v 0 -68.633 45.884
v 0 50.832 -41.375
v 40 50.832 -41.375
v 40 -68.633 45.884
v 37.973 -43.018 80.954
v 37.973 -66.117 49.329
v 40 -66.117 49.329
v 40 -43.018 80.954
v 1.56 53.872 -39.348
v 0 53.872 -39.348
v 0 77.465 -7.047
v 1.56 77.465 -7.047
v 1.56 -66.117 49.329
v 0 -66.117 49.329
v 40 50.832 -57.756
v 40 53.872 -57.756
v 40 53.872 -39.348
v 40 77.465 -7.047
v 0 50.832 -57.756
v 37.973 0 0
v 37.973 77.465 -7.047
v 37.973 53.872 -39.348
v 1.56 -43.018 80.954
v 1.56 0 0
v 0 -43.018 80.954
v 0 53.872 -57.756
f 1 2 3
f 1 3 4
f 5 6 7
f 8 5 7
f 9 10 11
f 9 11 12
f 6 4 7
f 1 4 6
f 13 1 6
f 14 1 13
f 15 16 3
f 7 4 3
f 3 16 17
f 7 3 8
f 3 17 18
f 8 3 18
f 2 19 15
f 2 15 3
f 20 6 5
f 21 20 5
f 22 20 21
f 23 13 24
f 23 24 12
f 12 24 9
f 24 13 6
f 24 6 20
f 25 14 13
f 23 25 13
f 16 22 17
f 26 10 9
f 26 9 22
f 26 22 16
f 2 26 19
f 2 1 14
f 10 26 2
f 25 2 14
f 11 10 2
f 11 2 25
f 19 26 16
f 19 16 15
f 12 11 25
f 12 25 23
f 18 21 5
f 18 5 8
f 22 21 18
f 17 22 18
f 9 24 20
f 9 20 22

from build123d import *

# Parameters (mm, degrees)
BOSS_EXTRUDE1_DEPTH = 40
SKETCH4_W           = 1.560342198
SKETCH4_H           = 149.198591979
BOSS_EXTRUDE2_DEPTH = 40
SKETCH6_W           = 2.027300843
SKETCH6_H           = 149.198591979
BOSS_EXTRUDE3_DEPTH = 40


with BuildPart() as part:
    # Sketch3 → Boss-Extrude1 (new body)
    with BuildSketch(Plane(origin=(0, 0, 0), x_dir=(0, 0, -1), z_dir=(1, 0, 0))):
        Polygon((0, 0), (39.348289754, 53.871692839), (57.75585878, 53.871692839), (57.75585878, 50.831910798), (41.374811114, 50.831910798), (-45.883583059, -68.633444315), (-49.329231032, -66.116717112), align=None)
    extrude(amount=BOSS_EXTRUDE1_DEPTH)

    # Sketch4 → Boss-Extrude2 (add)
    with BuildSketch(Plane(origin=(0, 0, 0), x_dir=(1, 0, 0), z_dir=(0, 0.5898261654750604, 0.8075302437190738))):
        with Locations((0.780171099, -7.887623879)):
            Rectangle(SKETCH4_W, SKETCH4_H)
    extrude(amount=BOSS_EXTRUDE2_DEPTH)

    # Sketch6 → Boss-Extrude3 (add)
    with BuildSketch(Plane(origin=(0, 0, 0), x_dir=(1, 0, 0), z_dir=(0, 0.5898261654750604, 0.8075302437190738))):
        with Locations((38.986349578, -7.887623879)):
            Rectangle(SKETCH6_W, SKETCH6_H)
    extrude(amount=BOSS_EXTRUDE3_DEPTH)


solid = part.part
